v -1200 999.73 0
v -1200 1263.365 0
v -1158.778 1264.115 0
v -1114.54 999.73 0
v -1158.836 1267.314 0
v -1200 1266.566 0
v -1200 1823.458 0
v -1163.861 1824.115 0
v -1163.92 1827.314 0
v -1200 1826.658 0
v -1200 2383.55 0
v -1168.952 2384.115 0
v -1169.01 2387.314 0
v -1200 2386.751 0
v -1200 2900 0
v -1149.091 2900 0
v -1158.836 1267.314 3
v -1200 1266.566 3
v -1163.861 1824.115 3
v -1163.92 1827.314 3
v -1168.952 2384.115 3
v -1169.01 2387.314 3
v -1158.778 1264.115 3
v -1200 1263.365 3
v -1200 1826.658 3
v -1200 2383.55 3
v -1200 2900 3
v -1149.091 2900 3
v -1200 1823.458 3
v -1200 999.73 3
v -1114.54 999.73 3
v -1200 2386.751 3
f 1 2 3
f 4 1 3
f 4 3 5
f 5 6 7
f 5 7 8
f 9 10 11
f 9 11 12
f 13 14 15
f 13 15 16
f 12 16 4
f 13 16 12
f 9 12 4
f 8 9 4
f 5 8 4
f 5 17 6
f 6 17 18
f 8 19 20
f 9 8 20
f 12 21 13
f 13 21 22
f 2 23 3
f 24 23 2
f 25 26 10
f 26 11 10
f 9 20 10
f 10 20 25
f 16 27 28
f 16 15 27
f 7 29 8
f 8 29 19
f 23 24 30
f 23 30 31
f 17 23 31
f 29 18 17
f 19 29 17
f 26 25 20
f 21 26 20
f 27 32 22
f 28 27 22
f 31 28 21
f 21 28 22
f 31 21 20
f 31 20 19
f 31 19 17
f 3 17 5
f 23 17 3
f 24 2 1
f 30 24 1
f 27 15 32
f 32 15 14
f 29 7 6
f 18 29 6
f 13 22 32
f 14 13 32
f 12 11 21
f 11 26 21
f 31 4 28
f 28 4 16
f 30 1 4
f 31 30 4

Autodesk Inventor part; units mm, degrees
ref_plane "YZ Plane" through (0, 0, 0) normal (1, 0, 0) x (0, 1, 0)
ref_plane "XZ Plane" through (0, 0, 0) normal (0, 1, 0) x (-1, 0, 0)
ref_plane "XY Plane" through (0, 0, 0) normal (0, 0, 1) x (1, 0, 0)
sketch "Sketch1" plane through (0, 0, 0) normal (0, 0, 1) x (1, 0, 0)
  line L0 (1200, 2950) -> (-1200, 2950)
  line L1 (-1200, 2950) -> (-1200, 0)
  line L2 (-1200, 0) -> (1200, 0)
  line L3 (1200, 0) -> (1200, 2950)
  line L4 (1150, 2950) -> (1150, 0)
  line L5 (-1150, 0) -> (-1150, 2950) construction
  line L6 (0, 2950) -> (0, 50) construction
  line L7 (-1100, 200) -> (-950, 50)
  line L8 (-1200, 100) -> (-1100, 100)
  line L9 (-1100, 100) -> (-1100, 0)
  line L10 (-1100, 200) -> (-1150, 2950)
  arc A0 (-1100.4545, 224.9959) -> (-1082.3223, 182.3223) centre (-1100, 200) ccw
  arc A1 (-1082.3223, 182.3223) -> (-1100.4545, 224.9959) centre (-1100, 200) ccw construction
  line L11 (-1200, 255) -> (-1101, 255) construction
  line L12 (0, 50) -> (-950, 50)
  line L13 (0, 50) -> (0, 0)
  line L14 (1505.3449, -225.894) -> (355.3449, -225.894)
  line L15 (-1200, 245) -> (-1100.8182, 245)
  line L16 (-1200, 2900) -> (-1149.0909, 2900)
  line L17 (-1200, 999.7296) -> (-1114.5405, 999.7296)
  dimension "d3" = 2400
  dimension "d4" = 2950
  dimension "d5" = 50
  dimension "d6" = 100
  dimension "d7" = 50
  dimension "d9" = 135
  dimension "d10" = 950
  dimension "d11" = 1150
  dimension "d12" = 136.042
  dimension "d13" = 50
  dimension "d14" = 100
  dimension "d15" = 212.132
  dimension "d17" = 55
  dimension "d20" = 200
  dimension "d50" = 2705
  dimension "d53" = 50
extrude "Plate1" add sketch "Sketch1" along normal blind 3 contours L10 L17 L1 L16
sketch "Sketch2" plane through (0, 0, 3) normal (0, 0, 1) x (1, 0, 0)
  line L0 (-1149.0909, 2900) -> (-1114.5405, 999.7296) projected
  line L1 (-1200, 999.7296) -> (-1200, 2900) projected
  line L2 (-1100.8182, 245) -> (-1149.0909, 2900) projected
  line L3 (-1158.8362, 1267.3142) -> (-1158.778, 1264.1148)
  line L4 (-1158.778, 1264.1148) -> (-1119.3606, 1264.8314) construction
  line L5 (-1149.0909, 2900) -> (-1100.8182, 245) projected
  line L6 (-1158.778, 1264.1148) -> (-1200, 1263.3653)
  line L7 (-1158.8362, 1267.3142) -> (-1200, 1266.5658)
  line L8 (-1200, 703.2727) -> (-1153.6813, 704.1149)
  line L9 (-1153.6813, 704.1149) -> (-1153.7395, 707.3144)
  line L10 (-1153.6813, 704.1149) -> (-1109.1804, 704.924) construction
  line L11 (-1153.7395, 707.3144) -> (-1200, 706.4732)
  line L12 (-1200, 1823.4578) -> (-1163.8614, 1824.1149)
  line L13 (-1163.8614, 1824.1149) -> (-1163.9196, 1827.3144)
  line L14 (-1163.9196, 1827.3144) -> (-1200, 1826.6584)
  line L15 (-1163.8614, 1824.1149) -> (-1129.5407, 1824.7389) construction
  line L16 (-1200, 2383.5504) -> (-1168.9515, 2384.1149)
  line L17 (-1168.9515, 2384.1149) -> (-1169.0097, 2387.3144)
  line L18 (-1168.9515, 2384.1149) -> (-1139.7208, 2384.6464) construction
  line L19 (-1169.0097, 2387.3144) -> (-1200, 2386.7509)
  line L20 (-1200, 2900) -> (-1149.0909, 2900) projected
  line L21 (-1114.5405, 999.7296) -> (-1200, 999.7296) projected
  point P0 (0, 0)
  point P1 (-1150, 2950)
  dimension "d34" = 46.3264
  dimension "d36" = 41.2288
  dimension "d39" = 36.1445
  dimension "d42" = 31.0536
  dimension "d43" = 560
  dimension "d44" = 3.2
  dimension "d45" = 560
  dimension "d46" = 3.2
  dimension "d47" = 560
  dimension "d48" = 3.2
  dimension "d49" = 3.2
  dimension "d52" = 460
extrude "Extrusion1" cut sketch "Sketch2" against normal through all contours L19 L17 L16 L1 | L1 L7 L3 L6 | L14 L13 L12 L1
sketch "Sketch3" plane through (0, 0, 0) normal (0, 0, -1) x (-1, 0, 0)
  line L0 (1163.9196, 1827.3144) -> (1200, 1826.6584) construction
  line L1 (1200, 2383.5504) -> (1200, 1826.6584) construction
  line L2 (1200, 2383.5504) -> (1168.9515, 2384.1149) construction
  line L3 (1168.9515, 2384.1149) -> (1169.0097, 2387.3144) construction
  line L4 (1169.0097, 2387.3144) -> (1200, 2386.7509) construction
  line L5 (1200, 2900) -> (1200, 2386.7509) construction
  line L6 (1149.0909, 2900) -> (1200, 2900) construction
  line L7 (1200, 1263.3653) -> (1158.778, 1264.1148) construction
  line L8 (1158.778, 1264.1148) -> (1158.8362, 1267.3142) construction
  line L9 (1158.8362, 1267.3142) -> (1200, 1266.5658) construction
  line L10 (1200, 1823.4578) -> (1200, 1266.5658) construction
  line L11 (1200, 1823.4578) -> (1163.8614, 1824.1149) construction
  line L12 (1163.8614, 1824.1149) -> (1163.9196, 1827.3144) construction
  line L13 (1130.7428, 1027.3062) -> (1187.6517, 1027.3062) construction
  line L14 (1187.6517, 1027.3062) -> (1187.6517, 1023.7324) construction
  line L15 (1187.6517, 1023.7324) -> (1130.7428, 1023.7324) construction
  line L16 (1130.7428, 1023.7324) -> (1130.7428, 1027.3062) construction
  point P0 (0, 0)
mark "Mark1"
equation "\"d11\" = d10 + d18"
equation "\"d14\" = d6"
equation "\"d43\" = Stringer1_step"
equation "\"d45\" = Stringer1_step"
equation "\"d47\" = Stringer1_step"
equation "\"d52\" = Stringer1_hight"
equation "\"d2\" = Thickness"
equation "\"BendReliefWidth\" = Thickness"
equation "\"BendReliefDepth\" = 0.5 * Thickness"
equation "\"CornerReliefSize\" = 4 * Thickness"
equation "\"MinimumRemnant\" = 2 * Thickness"
equation "\"TransitionRadius\" = BendRadius"
equation "\"JacobiRadiusSize\" = BendRadius"
equation "\"GapSize\" = Thickness"
equation "\"d18\" = d19"
equation "\"Stringer1_step\" = 560"
equation "\"Stringer1_hight\" = 460"
equation "\"Thickness\" = 3"
equation "\"BendRadius\" = 5"
equation "\"d19\" = 200"
properties part number "BSH 024 rib board short" material "09g2s"
